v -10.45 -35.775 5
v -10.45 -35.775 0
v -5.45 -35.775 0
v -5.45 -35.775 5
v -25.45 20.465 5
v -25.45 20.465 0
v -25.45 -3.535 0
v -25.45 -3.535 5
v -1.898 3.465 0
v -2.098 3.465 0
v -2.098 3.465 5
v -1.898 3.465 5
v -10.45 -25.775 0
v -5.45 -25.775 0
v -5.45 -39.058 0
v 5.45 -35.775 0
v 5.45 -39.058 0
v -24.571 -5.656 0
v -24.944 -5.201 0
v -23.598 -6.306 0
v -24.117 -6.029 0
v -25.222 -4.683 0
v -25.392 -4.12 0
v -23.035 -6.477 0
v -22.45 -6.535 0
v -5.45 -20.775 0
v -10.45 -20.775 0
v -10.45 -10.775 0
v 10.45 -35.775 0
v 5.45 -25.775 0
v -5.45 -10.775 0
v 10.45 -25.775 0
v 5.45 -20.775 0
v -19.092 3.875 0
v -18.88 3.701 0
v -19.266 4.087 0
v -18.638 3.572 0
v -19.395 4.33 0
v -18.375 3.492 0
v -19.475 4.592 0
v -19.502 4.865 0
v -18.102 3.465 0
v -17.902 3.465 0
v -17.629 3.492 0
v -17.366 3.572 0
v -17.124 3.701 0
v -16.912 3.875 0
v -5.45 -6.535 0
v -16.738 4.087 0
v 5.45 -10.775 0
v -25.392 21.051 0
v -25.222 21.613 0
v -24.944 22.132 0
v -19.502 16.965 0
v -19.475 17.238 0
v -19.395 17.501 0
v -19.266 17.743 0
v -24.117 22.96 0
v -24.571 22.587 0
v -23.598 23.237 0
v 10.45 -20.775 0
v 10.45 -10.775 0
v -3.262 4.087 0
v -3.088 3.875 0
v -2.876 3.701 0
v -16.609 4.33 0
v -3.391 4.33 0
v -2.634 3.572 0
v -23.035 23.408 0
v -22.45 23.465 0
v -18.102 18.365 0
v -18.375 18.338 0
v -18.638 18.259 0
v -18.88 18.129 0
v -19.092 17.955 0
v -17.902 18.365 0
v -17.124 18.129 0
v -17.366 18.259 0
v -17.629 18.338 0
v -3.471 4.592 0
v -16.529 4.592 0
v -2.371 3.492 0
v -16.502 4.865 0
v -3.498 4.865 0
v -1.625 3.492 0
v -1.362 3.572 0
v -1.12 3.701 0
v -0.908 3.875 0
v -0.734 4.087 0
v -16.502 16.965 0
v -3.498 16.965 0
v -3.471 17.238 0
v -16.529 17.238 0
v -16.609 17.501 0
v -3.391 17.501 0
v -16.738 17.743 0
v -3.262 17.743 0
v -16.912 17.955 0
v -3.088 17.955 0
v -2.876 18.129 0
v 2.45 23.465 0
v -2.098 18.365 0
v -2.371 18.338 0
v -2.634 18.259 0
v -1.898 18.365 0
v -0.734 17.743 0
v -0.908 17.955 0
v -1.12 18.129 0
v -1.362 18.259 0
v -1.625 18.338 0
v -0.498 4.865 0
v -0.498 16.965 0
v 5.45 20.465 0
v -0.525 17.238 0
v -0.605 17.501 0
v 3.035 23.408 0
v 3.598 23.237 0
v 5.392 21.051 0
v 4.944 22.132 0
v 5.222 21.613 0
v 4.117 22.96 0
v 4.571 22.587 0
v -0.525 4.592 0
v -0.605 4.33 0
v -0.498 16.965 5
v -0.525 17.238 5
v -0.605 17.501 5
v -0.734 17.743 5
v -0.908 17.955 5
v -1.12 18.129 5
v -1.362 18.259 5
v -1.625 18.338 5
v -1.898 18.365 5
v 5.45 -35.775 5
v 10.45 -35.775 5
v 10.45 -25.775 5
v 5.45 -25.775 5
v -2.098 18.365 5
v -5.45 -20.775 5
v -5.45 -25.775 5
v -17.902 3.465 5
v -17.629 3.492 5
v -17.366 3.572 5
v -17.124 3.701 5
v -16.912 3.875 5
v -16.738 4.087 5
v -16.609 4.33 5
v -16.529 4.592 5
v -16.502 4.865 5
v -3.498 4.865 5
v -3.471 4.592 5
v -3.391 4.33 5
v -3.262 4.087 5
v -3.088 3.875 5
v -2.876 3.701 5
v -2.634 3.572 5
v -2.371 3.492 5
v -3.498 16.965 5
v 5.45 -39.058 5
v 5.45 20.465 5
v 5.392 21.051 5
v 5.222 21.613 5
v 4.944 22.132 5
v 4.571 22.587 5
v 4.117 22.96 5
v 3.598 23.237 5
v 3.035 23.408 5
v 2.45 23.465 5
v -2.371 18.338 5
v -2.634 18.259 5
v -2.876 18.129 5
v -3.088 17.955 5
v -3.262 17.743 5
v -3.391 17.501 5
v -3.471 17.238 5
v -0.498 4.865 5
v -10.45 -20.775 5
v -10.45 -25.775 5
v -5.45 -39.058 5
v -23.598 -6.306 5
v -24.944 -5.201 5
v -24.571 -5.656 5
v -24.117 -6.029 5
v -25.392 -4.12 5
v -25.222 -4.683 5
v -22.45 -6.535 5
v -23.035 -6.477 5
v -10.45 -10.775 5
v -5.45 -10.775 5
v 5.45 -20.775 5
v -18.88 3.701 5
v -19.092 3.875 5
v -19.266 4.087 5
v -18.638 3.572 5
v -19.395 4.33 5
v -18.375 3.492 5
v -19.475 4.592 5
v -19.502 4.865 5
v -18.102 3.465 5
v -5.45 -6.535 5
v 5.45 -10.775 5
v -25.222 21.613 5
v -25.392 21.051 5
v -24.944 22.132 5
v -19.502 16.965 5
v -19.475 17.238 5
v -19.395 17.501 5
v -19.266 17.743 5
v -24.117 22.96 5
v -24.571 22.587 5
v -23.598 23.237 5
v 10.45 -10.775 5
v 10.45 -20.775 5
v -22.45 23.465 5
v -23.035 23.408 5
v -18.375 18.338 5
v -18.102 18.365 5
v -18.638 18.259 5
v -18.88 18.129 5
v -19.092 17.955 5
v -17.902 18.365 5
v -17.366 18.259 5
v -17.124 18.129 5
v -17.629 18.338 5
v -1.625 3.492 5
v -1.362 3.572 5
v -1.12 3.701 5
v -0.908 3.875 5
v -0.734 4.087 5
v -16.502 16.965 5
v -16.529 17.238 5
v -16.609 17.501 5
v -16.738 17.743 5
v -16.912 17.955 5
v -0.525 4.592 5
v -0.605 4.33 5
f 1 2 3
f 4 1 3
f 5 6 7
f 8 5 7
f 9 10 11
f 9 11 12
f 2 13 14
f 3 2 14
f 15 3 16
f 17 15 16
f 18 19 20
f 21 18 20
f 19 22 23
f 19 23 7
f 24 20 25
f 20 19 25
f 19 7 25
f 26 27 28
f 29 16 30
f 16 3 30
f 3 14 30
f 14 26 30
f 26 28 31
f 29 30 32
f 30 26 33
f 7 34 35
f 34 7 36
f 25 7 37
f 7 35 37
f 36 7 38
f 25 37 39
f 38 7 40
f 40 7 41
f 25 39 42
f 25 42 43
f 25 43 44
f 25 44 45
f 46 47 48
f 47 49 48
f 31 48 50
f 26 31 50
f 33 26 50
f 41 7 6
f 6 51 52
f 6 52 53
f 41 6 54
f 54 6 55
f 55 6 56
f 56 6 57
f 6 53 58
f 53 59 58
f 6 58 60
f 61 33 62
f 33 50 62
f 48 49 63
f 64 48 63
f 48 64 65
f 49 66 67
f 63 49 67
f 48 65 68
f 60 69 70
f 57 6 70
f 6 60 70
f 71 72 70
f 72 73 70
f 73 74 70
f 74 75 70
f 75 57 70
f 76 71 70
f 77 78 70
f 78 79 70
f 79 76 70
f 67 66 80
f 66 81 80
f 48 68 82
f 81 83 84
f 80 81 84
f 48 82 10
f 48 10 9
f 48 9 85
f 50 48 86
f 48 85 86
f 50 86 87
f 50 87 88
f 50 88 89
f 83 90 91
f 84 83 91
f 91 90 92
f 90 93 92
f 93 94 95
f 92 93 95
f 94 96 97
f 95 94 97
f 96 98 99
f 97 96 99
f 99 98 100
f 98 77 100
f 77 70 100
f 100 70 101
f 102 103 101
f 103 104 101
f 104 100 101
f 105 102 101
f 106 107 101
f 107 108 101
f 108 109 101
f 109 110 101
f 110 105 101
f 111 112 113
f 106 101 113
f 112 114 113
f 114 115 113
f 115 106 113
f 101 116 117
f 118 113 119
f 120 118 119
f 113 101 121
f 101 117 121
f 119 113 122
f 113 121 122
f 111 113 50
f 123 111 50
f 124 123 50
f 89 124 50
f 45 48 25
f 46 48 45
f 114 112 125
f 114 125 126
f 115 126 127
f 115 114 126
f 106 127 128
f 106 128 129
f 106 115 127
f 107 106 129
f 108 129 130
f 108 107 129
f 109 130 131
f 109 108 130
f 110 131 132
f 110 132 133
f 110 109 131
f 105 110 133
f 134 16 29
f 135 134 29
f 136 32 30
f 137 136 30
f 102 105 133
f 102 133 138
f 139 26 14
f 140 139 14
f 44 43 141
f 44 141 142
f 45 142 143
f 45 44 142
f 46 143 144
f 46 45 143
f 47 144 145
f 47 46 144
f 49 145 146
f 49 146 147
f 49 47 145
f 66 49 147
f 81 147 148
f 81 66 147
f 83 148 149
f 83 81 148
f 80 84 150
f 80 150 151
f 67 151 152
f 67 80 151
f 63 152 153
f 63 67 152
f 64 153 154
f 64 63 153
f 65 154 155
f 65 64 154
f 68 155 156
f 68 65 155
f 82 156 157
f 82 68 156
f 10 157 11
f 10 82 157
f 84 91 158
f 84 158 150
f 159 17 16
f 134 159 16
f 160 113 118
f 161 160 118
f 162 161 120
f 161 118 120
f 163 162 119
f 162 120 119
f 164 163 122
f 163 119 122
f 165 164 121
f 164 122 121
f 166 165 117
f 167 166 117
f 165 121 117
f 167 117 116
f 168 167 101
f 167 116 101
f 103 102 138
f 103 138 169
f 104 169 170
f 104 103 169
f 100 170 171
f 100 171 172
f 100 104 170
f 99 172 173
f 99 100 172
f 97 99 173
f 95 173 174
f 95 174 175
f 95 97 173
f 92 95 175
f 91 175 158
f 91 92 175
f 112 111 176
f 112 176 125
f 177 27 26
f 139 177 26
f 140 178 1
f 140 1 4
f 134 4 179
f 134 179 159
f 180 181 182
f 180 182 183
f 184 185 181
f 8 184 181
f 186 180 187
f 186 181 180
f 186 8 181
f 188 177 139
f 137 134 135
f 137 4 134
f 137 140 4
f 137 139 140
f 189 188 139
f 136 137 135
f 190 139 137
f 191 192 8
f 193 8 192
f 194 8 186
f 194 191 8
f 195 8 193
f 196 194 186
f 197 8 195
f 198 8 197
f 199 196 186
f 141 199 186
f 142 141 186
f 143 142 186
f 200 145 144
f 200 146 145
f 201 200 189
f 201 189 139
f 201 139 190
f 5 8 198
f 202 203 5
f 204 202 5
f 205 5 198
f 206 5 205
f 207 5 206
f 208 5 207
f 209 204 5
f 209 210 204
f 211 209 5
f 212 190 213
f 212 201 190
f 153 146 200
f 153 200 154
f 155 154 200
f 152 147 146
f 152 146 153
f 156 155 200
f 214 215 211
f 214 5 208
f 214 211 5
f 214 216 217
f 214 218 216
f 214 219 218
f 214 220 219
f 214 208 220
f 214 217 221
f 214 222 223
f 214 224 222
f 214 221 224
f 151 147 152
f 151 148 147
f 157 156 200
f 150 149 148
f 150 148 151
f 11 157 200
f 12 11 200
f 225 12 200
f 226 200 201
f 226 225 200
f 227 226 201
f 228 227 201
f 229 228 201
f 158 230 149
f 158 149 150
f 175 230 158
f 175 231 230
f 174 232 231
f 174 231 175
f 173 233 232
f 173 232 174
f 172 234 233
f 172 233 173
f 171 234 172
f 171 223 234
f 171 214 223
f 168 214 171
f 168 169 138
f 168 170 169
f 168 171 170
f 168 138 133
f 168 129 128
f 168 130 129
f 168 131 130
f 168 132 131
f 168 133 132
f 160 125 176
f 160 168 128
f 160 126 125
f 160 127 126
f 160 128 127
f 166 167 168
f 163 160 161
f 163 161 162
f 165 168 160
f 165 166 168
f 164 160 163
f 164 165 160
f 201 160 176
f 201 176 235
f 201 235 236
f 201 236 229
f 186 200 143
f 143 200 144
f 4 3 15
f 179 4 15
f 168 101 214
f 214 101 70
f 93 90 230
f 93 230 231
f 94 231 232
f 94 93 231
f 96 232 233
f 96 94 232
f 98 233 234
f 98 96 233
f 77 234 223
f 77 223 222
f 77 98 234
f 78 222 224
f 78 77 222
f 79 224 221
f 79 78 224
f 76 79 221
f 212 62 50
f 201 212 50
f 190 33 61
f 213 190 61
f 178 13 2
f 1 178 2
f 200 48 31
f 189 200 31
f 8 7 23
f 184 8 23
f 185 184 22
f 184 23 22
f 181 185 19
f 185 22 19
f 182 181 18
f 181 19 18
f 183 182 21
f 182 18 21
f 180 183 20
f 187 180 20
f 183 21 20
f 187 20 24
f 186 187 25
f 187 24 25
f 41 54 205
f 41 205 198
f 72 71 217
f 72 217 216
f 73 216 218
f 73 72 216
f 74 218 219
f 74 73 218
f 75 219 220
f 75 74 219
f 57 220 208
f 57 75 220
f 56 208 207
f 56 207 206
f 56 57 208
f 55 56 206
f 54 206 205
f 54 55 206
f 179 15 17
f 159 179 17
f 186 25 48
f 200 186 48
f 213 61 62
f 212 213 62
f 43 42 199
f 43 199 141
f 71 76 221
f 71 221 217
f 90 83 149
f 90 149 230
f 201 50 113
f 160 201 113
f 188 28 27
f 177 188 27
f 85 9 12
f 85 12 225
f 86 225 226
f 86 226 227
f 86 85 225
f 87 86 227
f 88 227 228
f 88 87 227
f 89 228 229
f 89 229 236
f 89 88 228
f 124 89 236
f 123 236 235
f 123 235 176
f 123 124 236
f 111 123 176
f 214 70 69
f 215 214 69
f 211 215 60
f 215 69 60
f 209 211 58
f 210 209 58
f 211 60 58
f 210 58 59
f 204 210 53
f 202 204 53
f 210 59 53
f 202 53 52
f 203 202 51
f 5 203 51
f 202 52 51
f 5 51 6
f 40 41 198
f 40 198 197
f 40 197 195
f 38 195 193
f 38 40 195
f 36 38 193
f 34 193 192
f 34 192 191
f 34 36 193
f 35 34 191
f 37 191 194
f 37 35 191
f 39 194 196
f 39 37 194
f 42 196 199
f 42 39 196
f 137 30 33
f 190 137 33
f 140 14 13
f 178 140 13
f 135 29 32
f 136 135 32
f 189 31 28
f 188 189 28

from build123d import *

# Parameters (mm, degrees)
BOSS_EXTRUDE1_DEPTH = 5


with BuildPart() as part:
    # Sketch1 → Boss-Extrude1 (new body)
    with BuildSketch(Plane.XY):
        with BuildLine():
            Line((-10.45, -25.774734933), (-10.45, -35.774734933))
            Line((-10.45, -35.774734933), (-5.45, -35.774734933))
            Line((-5.45, -35.774734933), (-5.45, -39.058458692))
            Line((-5.45, -39.058458692), (5.45, -39.058458692))
            Line((5.45, -39.058458692), (5.45, -35.774734933))
            Line((5.45, -35.774734933), (10.45, -35.774734933))
            Line((10.45, -35.774734933), (10.45, -25.774734933))
            Line((10.45, -25.774734933), (5.45, -25.774734933))
            Line((5.45, -25.774734933), (5.45, -20.774734933))
            Line((5.45, -20.774734933), (10.45, -20.774734933))
            Line((10.45, -20.774734933), (10.45, -10.774734933))
            Line((10.45, -10.774734933), (5.45, -10.774734933))
            Line((5.45, -10.774734933), (5.45, 20.465265067))
            ThreePointArc((5.45, 20.465265067), (4.571320344, 22.586585411), (2.45, 23.465265067))
            Line((2.45, 23.465265067), (-22.45, 23.465265067))
            ThreePointArc((-22.45, 23.465265067), (-24.571320344, 22.586585411), (-25.45, 20.465265067))
            Line((-25.45, 20.465265067), (-25.45, -3.534734933))
            ThreePointArc((-25.45, -3.534734933), (-24.571320344, -5.656055277), (-22.45, -6.534734933))
            Line((-22.45, -6.534734933), (-5.45, -6.534734933))
            Line((-5.45, -6.534734933), (-5.45, -10.774734933))
            Line((-5.45, -10.774734933), (-10.45, -10.774734933))
            Line((-10.45, -10.774734933), (-10.45, -20.774734933))
            Line((-10.45, -20.774734933), (-5.45, -20.774734933))
            Line((-5.45, -20.774734933), (-5.45, -25.774734933))
            Line((-5.45, -25.774734933), (-10.45, -25.774734933))
        make_face()
        with BuildLine():
            Line((-19.50201423, 16.965265067), (-19.50201423, 4.865265067))
            ThreePointArc((-19.50201423, 4.865265067), (-19.091963724, 3.875315573), (-18.10201423, 3.465265067))
            Line((-18.10201423, 3.465265067), (-17.90201423, 3.465265067))
            ThreePointArc((-17.90201423, 3.465265067), (-16.912064737, 3.875315573), (-16.50201423, 4.865265067))
            Line((-16.50201423, 4.865265067), (-16.50201423, 16.965265067))
            ThreePointArc((-16.50201423, 16.965265067), (-16.912064737, 17.955214561), (-17.90201423, 18.365265067))
            Line((-17.90201423, 18.365265067), (-18.10201423, 18.365265067))
            ThreePointArc((-18.10201423, 18.365265067), (-19.091963724, 17.955214561), (-19.50201423, 16.965265067))
        make_face(mode=Mode.SUBTRACT)
        with BuildLine():
            Line((-3.49798577, 16.965265067), (-3.49798577, 4.865265067))
            ThreePointArc((-3.49798577, 4.865265067), (-3.087935263, 3.875315573), (-2.09798577, 3.465265067))
            Line((-2.09798577, 3.465265067), (-1.89798577, 3.465265067))
            ThreePointArc((-1.89798577, 3.465265067), (-0.908036276, 3.875315573), (-0.49798577, 4.865265067))
            Line((-0.49798577, 4.865265067), (-0.49798577, 16.965265067))
            ThreePointArc((-0.49798577, 16.965265067), (-0.908036276, 17.955214561), (-1.89798577, 18.365265067))
            Line((-1.89798577, 18.365265067), (-2.09798577, 18.365265067))
            ThreePointArc((-2.09798577, 18.365265067), (-3.087935263, 17.955214561), (-3.49798577, 16.965265067))
        make_face(mode=Mode.SUBTRACT)
    extrude(amount=BOSS_EXTRUDE1_DEPTH)


solid = part.part
